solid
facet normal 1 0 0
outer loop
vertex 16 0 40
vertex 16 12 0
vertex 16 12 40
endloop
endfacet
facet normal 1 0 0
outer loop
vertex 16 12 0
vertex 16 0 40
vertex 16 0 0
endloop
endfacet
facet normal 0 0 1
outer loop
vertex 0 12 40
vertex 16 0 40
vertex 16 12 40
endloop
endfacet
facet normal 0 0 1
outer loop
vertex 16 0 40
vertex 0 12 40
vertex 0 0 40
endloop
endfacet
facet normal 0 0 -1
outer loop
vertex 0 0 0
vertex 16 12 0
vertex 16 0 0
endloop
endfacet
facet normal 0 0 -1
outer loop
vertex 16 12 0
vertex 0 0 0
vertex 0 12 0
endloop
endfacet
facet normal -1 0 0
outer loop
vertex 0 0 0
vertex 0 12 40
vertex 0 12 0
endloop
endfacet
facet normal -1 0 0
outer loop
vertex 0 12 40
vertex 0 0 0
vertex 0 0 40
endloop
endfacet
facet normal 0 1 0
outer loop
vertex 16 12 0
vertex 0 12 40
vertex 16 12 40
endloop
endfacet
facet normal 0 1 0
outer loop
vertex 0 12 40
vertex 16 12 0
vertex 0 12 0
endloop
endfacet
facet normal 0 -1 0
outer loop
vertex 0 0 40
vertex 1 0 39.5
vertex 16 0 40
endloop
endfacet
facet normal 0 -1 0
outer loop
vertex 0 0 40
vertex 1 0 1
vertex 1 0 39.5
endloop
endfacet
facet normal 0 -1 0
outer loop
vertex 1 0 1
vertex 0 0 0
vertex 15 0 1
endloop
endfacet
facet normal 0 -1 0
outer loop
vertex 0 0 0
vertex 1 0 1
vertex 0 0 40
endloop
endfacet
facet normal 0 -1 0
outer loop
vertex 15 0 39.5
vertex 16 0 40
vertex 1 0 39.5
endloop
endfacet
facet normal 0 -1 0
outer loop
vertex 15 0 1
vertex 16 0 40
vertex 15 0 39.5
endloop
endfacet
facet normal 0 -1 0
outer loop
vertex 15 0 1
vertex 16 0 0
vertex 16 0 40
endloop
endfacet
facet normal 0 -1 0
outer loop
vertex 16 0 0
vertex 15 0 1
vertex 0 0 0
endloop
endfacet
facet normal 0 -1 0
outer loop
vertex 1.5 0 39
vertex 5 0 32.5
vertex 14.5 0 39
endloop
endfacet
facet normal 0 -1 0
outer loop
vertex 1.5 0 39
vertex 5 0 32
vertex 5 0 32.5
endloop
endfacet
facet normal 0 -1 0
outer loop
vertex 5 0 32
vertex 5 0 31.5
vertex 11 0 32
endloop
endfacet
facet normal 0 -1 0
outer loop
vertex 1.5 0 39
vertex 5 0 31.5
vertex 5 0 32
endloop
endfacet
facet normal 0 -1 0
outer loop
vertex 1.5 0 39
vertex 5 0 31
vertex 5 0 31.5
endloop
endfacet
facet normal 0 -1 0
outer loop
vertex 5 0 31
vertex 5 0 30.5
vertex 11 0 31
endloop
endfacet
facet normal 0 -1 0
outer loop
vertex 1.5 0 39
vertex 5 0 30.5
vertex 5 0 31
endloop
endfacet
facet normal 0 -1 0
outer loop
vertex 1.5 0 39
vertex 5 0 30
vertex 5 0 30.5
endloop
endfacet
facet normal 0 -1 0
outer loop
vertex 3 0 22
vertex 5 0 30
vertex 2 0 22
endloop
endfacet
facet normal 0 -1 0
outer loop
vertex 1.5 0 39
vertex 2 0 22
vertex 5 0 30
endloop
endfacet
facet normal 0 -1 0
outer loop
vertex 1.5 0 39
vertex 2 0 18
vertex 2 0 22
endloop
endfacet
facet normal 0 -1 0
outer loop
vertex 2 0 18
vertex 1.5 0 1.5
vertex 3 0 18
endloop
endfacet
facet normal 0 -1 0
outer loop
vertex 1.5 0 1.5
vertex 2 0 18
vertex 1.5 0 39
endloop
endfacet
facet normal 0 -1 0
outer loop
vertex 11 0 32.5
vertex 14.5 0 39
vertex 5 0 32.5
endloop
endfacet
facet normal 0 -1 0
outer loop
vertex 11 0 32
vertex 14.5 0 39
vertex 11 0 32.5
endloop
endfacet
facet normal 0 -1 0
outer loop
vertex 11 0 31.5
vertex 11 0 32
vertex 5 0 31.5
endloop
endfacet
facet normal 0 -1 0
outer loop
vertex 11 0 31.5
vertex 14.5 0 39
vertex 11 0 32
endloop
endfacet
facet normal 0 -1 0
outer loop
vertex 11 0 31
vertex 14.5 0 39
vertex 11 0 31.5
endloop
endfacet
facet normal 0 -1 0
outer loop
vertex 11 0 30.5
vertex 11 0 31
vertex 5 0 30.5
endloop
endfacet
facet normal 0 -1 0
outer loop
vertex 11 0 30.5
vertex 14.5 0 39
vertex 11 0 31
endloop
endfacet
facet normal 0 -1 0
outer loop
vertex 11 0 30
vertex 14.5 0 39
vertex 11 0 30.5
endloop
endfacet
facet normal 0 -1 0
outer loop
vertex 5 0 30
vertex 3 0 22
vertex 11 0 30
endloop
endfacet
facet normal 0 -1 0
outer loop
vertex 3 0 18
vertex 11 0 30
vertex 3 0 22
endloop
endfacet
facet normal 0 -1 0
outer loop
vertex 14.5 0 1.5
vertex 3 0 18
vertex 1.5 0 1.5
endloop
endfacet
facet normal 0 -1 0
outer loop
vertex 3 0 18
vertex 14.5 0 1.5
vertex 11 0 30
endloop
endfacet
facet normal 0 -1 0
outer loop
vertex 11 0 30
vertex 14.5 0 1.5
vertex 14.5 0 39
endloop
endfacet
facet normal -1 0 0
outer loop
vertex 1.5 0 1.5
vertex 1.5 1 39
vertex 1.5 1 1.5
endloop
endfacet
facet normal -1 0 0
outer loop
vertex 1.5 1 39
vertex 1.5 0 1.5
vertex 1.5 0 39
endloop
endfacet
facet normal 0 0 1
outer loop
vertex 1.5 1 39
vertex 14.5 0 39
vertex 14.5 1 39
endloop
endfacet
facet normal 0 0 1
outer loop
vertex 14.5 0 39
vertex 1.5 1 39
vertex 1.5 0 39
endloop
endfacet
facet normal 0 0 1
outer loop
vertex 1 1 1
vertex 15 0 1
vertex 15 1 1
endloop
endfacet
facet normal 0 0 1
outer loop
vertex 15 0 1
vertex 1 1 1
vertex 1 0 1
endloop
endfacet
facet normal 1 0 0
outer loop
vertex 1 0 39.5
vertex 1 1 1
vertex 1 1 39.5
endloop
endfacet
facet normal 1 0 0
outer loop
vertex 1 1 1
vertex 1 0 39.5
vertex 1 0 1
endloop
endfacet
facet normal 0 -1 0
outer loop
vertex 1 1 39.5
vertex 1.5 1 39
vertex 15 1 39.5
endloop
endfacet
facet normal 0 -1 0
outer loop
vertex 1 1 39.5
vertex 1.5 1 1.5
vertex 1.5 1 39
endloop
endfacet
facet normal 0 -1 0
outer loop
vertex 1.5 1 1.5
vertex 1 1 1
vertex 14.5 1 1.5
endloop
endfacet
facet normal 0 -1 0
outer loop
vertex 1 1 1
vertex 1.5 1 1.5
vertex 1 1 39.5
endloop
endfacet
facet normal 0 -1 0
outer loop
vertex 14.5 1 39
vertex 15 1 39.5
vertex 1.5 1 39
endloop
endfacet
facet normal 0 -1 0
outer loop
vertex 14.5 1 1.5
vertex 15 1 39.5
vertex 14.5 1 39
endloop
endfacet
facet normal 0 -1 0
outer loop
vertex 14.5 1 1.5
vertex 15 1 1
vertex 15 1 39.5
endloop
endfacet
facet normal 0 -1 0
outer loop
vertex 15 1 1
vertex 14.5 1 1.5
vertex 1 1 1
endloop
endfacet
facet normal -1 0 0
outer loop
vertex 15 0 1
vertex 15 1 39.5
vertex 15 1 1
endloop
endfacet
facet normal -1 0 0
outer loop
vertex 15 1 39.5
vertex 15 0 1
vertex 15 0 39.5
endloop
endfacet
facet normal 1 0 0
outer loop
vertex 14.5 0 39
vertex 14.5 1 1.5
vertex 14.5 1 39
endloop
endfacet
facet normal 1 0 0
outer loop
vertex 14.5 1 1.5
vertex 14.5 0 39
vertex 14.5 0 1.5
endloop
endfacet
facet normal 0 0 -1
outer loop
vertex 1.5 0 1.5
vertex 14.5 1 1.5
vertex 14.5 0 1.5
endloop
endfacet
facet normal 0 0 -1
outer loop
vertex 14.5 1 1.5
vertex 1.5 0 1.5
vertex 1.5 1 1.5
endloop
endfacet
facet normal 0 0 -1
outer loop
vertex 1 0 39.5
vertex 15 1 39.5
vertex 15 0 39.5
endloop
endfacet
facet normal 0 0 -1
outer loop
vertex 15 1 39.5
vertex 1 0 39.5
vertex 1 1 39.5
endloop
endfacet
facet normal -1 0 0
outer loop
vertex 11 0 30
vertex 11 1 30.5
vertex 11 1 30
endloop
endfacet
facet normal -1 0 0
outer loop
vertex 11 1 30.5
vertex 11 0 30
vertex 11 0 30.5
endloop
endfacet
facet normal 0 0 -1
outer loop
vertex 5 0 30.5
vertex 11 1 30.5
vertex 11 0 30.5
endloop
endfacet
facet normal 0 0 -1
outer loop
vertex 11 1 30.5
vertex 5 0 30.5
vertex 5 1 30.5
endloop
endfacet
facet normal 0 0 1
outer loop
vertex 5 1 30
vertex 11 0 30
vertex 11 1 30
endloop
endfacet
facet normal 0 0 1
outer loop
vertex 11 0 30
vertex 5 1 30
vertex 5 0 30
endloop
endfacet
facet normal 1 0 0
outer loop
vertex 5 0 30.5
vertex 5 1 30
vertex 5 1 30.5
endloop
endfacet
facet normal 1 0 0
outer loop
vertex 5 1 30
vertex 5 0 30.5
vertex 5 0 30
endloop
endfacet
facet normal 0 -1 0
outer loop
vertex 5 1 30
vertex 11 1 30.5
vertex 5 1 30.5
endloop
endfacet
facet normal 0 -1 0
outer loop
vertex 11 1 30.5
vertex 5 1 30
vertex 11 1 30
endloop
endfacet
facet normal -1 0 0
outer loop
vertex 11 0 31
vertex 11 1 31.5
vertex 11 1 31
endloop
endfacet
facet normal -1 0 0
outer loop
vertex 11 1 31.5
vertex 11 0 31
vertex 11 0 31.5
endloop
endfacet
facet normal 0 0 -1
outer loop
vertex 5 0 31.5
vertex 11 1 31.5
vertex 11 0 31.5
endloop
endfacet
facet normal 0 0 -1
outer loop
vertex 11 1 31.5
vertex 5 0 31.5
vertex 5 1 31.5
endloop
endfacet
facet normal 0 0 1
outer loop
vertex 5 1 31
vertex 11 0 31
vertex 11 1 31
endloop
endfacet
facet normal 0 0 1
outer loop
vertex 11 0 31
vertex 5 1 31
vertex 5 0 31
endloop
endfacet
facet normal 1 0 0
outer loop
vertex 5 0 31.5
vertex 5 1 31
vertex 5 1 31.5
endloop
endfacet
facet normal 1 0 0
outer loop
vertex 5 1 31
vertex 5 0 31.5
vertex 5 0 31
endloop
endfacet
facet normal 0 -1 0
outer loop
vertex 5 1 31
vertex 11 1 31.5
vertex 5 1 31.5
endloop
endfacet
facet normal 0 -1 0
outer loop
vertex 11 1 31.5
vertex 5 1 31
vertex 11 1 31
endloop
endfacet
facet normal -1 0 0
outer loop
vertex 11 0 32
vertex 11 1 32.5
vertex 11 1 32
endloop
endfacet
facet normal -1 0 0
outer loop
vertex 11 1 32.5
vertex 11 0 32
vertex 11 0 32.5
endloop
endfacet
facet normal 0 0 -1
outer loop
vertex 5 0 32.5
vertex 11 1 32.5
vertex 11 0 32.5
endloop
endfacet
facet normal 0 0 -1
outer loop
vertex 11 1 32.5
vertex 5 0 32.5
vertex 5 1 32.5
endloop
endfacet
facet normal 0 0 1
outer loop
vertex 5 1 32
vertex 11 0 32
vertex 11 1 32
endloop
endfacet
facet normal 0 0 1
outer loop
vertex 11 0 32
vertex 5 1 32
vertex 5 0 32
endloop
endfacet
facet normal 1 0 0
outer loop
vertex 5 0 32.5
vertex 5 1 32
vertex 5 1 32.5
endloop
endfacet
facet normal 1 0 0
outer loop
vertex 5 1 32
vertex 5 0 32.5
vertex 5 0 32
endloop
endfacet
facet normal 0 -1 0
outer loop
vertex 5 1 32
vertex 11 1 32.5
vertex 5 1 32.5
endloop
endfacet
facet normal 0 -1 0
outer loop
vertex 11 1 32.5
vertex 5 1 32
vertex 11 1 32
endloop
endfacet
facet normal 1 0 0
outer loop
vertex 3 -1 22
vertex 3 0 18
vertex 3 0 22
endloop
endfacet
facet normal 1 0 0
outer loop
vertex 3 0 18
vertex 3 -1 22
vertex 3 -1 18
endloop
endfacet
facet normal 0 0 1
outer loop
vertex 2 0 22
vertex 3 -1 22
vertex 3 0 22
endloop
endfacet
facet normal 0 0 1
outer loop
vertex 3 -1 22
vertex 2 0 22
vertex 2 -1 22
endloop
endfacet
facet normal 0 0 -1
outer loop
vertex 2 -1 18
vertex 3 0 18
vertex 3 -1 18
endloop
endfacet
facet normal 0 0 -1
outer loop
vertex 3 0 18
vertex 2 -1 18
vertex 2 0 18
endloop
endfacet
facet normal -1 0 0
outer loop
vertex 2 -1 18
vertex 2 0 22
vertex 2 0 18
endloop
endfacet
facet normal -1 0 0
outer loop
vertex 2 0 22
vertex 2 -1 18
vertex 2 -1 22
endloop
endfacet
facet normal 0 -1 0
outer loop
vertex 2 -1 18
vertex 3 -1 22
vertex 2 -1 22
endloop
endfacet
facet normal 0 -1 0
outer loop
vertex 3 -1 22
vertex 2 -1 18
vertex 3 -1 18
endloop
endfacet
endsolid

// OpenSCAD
difference()
{
    cube([16,12,40]);
    translate([1,0,1]) cube([0.5,1,38]);
    translate([14.5,0,1]) cube([0.5,1,38]);
    translate([1,0,1]) cube([14,1,0.5]);
    translate([1,0,39]) cube([14,1,0.5]);
    translate([5,0,30]) cube([6,1,0.5]);
    translate([5,0,31]) cube([6,1,0.5]);
    translate([5,0,32]) cube([6,1,0.5]);
}
translate([2,-1,18]) cube([1,1,4]);    
